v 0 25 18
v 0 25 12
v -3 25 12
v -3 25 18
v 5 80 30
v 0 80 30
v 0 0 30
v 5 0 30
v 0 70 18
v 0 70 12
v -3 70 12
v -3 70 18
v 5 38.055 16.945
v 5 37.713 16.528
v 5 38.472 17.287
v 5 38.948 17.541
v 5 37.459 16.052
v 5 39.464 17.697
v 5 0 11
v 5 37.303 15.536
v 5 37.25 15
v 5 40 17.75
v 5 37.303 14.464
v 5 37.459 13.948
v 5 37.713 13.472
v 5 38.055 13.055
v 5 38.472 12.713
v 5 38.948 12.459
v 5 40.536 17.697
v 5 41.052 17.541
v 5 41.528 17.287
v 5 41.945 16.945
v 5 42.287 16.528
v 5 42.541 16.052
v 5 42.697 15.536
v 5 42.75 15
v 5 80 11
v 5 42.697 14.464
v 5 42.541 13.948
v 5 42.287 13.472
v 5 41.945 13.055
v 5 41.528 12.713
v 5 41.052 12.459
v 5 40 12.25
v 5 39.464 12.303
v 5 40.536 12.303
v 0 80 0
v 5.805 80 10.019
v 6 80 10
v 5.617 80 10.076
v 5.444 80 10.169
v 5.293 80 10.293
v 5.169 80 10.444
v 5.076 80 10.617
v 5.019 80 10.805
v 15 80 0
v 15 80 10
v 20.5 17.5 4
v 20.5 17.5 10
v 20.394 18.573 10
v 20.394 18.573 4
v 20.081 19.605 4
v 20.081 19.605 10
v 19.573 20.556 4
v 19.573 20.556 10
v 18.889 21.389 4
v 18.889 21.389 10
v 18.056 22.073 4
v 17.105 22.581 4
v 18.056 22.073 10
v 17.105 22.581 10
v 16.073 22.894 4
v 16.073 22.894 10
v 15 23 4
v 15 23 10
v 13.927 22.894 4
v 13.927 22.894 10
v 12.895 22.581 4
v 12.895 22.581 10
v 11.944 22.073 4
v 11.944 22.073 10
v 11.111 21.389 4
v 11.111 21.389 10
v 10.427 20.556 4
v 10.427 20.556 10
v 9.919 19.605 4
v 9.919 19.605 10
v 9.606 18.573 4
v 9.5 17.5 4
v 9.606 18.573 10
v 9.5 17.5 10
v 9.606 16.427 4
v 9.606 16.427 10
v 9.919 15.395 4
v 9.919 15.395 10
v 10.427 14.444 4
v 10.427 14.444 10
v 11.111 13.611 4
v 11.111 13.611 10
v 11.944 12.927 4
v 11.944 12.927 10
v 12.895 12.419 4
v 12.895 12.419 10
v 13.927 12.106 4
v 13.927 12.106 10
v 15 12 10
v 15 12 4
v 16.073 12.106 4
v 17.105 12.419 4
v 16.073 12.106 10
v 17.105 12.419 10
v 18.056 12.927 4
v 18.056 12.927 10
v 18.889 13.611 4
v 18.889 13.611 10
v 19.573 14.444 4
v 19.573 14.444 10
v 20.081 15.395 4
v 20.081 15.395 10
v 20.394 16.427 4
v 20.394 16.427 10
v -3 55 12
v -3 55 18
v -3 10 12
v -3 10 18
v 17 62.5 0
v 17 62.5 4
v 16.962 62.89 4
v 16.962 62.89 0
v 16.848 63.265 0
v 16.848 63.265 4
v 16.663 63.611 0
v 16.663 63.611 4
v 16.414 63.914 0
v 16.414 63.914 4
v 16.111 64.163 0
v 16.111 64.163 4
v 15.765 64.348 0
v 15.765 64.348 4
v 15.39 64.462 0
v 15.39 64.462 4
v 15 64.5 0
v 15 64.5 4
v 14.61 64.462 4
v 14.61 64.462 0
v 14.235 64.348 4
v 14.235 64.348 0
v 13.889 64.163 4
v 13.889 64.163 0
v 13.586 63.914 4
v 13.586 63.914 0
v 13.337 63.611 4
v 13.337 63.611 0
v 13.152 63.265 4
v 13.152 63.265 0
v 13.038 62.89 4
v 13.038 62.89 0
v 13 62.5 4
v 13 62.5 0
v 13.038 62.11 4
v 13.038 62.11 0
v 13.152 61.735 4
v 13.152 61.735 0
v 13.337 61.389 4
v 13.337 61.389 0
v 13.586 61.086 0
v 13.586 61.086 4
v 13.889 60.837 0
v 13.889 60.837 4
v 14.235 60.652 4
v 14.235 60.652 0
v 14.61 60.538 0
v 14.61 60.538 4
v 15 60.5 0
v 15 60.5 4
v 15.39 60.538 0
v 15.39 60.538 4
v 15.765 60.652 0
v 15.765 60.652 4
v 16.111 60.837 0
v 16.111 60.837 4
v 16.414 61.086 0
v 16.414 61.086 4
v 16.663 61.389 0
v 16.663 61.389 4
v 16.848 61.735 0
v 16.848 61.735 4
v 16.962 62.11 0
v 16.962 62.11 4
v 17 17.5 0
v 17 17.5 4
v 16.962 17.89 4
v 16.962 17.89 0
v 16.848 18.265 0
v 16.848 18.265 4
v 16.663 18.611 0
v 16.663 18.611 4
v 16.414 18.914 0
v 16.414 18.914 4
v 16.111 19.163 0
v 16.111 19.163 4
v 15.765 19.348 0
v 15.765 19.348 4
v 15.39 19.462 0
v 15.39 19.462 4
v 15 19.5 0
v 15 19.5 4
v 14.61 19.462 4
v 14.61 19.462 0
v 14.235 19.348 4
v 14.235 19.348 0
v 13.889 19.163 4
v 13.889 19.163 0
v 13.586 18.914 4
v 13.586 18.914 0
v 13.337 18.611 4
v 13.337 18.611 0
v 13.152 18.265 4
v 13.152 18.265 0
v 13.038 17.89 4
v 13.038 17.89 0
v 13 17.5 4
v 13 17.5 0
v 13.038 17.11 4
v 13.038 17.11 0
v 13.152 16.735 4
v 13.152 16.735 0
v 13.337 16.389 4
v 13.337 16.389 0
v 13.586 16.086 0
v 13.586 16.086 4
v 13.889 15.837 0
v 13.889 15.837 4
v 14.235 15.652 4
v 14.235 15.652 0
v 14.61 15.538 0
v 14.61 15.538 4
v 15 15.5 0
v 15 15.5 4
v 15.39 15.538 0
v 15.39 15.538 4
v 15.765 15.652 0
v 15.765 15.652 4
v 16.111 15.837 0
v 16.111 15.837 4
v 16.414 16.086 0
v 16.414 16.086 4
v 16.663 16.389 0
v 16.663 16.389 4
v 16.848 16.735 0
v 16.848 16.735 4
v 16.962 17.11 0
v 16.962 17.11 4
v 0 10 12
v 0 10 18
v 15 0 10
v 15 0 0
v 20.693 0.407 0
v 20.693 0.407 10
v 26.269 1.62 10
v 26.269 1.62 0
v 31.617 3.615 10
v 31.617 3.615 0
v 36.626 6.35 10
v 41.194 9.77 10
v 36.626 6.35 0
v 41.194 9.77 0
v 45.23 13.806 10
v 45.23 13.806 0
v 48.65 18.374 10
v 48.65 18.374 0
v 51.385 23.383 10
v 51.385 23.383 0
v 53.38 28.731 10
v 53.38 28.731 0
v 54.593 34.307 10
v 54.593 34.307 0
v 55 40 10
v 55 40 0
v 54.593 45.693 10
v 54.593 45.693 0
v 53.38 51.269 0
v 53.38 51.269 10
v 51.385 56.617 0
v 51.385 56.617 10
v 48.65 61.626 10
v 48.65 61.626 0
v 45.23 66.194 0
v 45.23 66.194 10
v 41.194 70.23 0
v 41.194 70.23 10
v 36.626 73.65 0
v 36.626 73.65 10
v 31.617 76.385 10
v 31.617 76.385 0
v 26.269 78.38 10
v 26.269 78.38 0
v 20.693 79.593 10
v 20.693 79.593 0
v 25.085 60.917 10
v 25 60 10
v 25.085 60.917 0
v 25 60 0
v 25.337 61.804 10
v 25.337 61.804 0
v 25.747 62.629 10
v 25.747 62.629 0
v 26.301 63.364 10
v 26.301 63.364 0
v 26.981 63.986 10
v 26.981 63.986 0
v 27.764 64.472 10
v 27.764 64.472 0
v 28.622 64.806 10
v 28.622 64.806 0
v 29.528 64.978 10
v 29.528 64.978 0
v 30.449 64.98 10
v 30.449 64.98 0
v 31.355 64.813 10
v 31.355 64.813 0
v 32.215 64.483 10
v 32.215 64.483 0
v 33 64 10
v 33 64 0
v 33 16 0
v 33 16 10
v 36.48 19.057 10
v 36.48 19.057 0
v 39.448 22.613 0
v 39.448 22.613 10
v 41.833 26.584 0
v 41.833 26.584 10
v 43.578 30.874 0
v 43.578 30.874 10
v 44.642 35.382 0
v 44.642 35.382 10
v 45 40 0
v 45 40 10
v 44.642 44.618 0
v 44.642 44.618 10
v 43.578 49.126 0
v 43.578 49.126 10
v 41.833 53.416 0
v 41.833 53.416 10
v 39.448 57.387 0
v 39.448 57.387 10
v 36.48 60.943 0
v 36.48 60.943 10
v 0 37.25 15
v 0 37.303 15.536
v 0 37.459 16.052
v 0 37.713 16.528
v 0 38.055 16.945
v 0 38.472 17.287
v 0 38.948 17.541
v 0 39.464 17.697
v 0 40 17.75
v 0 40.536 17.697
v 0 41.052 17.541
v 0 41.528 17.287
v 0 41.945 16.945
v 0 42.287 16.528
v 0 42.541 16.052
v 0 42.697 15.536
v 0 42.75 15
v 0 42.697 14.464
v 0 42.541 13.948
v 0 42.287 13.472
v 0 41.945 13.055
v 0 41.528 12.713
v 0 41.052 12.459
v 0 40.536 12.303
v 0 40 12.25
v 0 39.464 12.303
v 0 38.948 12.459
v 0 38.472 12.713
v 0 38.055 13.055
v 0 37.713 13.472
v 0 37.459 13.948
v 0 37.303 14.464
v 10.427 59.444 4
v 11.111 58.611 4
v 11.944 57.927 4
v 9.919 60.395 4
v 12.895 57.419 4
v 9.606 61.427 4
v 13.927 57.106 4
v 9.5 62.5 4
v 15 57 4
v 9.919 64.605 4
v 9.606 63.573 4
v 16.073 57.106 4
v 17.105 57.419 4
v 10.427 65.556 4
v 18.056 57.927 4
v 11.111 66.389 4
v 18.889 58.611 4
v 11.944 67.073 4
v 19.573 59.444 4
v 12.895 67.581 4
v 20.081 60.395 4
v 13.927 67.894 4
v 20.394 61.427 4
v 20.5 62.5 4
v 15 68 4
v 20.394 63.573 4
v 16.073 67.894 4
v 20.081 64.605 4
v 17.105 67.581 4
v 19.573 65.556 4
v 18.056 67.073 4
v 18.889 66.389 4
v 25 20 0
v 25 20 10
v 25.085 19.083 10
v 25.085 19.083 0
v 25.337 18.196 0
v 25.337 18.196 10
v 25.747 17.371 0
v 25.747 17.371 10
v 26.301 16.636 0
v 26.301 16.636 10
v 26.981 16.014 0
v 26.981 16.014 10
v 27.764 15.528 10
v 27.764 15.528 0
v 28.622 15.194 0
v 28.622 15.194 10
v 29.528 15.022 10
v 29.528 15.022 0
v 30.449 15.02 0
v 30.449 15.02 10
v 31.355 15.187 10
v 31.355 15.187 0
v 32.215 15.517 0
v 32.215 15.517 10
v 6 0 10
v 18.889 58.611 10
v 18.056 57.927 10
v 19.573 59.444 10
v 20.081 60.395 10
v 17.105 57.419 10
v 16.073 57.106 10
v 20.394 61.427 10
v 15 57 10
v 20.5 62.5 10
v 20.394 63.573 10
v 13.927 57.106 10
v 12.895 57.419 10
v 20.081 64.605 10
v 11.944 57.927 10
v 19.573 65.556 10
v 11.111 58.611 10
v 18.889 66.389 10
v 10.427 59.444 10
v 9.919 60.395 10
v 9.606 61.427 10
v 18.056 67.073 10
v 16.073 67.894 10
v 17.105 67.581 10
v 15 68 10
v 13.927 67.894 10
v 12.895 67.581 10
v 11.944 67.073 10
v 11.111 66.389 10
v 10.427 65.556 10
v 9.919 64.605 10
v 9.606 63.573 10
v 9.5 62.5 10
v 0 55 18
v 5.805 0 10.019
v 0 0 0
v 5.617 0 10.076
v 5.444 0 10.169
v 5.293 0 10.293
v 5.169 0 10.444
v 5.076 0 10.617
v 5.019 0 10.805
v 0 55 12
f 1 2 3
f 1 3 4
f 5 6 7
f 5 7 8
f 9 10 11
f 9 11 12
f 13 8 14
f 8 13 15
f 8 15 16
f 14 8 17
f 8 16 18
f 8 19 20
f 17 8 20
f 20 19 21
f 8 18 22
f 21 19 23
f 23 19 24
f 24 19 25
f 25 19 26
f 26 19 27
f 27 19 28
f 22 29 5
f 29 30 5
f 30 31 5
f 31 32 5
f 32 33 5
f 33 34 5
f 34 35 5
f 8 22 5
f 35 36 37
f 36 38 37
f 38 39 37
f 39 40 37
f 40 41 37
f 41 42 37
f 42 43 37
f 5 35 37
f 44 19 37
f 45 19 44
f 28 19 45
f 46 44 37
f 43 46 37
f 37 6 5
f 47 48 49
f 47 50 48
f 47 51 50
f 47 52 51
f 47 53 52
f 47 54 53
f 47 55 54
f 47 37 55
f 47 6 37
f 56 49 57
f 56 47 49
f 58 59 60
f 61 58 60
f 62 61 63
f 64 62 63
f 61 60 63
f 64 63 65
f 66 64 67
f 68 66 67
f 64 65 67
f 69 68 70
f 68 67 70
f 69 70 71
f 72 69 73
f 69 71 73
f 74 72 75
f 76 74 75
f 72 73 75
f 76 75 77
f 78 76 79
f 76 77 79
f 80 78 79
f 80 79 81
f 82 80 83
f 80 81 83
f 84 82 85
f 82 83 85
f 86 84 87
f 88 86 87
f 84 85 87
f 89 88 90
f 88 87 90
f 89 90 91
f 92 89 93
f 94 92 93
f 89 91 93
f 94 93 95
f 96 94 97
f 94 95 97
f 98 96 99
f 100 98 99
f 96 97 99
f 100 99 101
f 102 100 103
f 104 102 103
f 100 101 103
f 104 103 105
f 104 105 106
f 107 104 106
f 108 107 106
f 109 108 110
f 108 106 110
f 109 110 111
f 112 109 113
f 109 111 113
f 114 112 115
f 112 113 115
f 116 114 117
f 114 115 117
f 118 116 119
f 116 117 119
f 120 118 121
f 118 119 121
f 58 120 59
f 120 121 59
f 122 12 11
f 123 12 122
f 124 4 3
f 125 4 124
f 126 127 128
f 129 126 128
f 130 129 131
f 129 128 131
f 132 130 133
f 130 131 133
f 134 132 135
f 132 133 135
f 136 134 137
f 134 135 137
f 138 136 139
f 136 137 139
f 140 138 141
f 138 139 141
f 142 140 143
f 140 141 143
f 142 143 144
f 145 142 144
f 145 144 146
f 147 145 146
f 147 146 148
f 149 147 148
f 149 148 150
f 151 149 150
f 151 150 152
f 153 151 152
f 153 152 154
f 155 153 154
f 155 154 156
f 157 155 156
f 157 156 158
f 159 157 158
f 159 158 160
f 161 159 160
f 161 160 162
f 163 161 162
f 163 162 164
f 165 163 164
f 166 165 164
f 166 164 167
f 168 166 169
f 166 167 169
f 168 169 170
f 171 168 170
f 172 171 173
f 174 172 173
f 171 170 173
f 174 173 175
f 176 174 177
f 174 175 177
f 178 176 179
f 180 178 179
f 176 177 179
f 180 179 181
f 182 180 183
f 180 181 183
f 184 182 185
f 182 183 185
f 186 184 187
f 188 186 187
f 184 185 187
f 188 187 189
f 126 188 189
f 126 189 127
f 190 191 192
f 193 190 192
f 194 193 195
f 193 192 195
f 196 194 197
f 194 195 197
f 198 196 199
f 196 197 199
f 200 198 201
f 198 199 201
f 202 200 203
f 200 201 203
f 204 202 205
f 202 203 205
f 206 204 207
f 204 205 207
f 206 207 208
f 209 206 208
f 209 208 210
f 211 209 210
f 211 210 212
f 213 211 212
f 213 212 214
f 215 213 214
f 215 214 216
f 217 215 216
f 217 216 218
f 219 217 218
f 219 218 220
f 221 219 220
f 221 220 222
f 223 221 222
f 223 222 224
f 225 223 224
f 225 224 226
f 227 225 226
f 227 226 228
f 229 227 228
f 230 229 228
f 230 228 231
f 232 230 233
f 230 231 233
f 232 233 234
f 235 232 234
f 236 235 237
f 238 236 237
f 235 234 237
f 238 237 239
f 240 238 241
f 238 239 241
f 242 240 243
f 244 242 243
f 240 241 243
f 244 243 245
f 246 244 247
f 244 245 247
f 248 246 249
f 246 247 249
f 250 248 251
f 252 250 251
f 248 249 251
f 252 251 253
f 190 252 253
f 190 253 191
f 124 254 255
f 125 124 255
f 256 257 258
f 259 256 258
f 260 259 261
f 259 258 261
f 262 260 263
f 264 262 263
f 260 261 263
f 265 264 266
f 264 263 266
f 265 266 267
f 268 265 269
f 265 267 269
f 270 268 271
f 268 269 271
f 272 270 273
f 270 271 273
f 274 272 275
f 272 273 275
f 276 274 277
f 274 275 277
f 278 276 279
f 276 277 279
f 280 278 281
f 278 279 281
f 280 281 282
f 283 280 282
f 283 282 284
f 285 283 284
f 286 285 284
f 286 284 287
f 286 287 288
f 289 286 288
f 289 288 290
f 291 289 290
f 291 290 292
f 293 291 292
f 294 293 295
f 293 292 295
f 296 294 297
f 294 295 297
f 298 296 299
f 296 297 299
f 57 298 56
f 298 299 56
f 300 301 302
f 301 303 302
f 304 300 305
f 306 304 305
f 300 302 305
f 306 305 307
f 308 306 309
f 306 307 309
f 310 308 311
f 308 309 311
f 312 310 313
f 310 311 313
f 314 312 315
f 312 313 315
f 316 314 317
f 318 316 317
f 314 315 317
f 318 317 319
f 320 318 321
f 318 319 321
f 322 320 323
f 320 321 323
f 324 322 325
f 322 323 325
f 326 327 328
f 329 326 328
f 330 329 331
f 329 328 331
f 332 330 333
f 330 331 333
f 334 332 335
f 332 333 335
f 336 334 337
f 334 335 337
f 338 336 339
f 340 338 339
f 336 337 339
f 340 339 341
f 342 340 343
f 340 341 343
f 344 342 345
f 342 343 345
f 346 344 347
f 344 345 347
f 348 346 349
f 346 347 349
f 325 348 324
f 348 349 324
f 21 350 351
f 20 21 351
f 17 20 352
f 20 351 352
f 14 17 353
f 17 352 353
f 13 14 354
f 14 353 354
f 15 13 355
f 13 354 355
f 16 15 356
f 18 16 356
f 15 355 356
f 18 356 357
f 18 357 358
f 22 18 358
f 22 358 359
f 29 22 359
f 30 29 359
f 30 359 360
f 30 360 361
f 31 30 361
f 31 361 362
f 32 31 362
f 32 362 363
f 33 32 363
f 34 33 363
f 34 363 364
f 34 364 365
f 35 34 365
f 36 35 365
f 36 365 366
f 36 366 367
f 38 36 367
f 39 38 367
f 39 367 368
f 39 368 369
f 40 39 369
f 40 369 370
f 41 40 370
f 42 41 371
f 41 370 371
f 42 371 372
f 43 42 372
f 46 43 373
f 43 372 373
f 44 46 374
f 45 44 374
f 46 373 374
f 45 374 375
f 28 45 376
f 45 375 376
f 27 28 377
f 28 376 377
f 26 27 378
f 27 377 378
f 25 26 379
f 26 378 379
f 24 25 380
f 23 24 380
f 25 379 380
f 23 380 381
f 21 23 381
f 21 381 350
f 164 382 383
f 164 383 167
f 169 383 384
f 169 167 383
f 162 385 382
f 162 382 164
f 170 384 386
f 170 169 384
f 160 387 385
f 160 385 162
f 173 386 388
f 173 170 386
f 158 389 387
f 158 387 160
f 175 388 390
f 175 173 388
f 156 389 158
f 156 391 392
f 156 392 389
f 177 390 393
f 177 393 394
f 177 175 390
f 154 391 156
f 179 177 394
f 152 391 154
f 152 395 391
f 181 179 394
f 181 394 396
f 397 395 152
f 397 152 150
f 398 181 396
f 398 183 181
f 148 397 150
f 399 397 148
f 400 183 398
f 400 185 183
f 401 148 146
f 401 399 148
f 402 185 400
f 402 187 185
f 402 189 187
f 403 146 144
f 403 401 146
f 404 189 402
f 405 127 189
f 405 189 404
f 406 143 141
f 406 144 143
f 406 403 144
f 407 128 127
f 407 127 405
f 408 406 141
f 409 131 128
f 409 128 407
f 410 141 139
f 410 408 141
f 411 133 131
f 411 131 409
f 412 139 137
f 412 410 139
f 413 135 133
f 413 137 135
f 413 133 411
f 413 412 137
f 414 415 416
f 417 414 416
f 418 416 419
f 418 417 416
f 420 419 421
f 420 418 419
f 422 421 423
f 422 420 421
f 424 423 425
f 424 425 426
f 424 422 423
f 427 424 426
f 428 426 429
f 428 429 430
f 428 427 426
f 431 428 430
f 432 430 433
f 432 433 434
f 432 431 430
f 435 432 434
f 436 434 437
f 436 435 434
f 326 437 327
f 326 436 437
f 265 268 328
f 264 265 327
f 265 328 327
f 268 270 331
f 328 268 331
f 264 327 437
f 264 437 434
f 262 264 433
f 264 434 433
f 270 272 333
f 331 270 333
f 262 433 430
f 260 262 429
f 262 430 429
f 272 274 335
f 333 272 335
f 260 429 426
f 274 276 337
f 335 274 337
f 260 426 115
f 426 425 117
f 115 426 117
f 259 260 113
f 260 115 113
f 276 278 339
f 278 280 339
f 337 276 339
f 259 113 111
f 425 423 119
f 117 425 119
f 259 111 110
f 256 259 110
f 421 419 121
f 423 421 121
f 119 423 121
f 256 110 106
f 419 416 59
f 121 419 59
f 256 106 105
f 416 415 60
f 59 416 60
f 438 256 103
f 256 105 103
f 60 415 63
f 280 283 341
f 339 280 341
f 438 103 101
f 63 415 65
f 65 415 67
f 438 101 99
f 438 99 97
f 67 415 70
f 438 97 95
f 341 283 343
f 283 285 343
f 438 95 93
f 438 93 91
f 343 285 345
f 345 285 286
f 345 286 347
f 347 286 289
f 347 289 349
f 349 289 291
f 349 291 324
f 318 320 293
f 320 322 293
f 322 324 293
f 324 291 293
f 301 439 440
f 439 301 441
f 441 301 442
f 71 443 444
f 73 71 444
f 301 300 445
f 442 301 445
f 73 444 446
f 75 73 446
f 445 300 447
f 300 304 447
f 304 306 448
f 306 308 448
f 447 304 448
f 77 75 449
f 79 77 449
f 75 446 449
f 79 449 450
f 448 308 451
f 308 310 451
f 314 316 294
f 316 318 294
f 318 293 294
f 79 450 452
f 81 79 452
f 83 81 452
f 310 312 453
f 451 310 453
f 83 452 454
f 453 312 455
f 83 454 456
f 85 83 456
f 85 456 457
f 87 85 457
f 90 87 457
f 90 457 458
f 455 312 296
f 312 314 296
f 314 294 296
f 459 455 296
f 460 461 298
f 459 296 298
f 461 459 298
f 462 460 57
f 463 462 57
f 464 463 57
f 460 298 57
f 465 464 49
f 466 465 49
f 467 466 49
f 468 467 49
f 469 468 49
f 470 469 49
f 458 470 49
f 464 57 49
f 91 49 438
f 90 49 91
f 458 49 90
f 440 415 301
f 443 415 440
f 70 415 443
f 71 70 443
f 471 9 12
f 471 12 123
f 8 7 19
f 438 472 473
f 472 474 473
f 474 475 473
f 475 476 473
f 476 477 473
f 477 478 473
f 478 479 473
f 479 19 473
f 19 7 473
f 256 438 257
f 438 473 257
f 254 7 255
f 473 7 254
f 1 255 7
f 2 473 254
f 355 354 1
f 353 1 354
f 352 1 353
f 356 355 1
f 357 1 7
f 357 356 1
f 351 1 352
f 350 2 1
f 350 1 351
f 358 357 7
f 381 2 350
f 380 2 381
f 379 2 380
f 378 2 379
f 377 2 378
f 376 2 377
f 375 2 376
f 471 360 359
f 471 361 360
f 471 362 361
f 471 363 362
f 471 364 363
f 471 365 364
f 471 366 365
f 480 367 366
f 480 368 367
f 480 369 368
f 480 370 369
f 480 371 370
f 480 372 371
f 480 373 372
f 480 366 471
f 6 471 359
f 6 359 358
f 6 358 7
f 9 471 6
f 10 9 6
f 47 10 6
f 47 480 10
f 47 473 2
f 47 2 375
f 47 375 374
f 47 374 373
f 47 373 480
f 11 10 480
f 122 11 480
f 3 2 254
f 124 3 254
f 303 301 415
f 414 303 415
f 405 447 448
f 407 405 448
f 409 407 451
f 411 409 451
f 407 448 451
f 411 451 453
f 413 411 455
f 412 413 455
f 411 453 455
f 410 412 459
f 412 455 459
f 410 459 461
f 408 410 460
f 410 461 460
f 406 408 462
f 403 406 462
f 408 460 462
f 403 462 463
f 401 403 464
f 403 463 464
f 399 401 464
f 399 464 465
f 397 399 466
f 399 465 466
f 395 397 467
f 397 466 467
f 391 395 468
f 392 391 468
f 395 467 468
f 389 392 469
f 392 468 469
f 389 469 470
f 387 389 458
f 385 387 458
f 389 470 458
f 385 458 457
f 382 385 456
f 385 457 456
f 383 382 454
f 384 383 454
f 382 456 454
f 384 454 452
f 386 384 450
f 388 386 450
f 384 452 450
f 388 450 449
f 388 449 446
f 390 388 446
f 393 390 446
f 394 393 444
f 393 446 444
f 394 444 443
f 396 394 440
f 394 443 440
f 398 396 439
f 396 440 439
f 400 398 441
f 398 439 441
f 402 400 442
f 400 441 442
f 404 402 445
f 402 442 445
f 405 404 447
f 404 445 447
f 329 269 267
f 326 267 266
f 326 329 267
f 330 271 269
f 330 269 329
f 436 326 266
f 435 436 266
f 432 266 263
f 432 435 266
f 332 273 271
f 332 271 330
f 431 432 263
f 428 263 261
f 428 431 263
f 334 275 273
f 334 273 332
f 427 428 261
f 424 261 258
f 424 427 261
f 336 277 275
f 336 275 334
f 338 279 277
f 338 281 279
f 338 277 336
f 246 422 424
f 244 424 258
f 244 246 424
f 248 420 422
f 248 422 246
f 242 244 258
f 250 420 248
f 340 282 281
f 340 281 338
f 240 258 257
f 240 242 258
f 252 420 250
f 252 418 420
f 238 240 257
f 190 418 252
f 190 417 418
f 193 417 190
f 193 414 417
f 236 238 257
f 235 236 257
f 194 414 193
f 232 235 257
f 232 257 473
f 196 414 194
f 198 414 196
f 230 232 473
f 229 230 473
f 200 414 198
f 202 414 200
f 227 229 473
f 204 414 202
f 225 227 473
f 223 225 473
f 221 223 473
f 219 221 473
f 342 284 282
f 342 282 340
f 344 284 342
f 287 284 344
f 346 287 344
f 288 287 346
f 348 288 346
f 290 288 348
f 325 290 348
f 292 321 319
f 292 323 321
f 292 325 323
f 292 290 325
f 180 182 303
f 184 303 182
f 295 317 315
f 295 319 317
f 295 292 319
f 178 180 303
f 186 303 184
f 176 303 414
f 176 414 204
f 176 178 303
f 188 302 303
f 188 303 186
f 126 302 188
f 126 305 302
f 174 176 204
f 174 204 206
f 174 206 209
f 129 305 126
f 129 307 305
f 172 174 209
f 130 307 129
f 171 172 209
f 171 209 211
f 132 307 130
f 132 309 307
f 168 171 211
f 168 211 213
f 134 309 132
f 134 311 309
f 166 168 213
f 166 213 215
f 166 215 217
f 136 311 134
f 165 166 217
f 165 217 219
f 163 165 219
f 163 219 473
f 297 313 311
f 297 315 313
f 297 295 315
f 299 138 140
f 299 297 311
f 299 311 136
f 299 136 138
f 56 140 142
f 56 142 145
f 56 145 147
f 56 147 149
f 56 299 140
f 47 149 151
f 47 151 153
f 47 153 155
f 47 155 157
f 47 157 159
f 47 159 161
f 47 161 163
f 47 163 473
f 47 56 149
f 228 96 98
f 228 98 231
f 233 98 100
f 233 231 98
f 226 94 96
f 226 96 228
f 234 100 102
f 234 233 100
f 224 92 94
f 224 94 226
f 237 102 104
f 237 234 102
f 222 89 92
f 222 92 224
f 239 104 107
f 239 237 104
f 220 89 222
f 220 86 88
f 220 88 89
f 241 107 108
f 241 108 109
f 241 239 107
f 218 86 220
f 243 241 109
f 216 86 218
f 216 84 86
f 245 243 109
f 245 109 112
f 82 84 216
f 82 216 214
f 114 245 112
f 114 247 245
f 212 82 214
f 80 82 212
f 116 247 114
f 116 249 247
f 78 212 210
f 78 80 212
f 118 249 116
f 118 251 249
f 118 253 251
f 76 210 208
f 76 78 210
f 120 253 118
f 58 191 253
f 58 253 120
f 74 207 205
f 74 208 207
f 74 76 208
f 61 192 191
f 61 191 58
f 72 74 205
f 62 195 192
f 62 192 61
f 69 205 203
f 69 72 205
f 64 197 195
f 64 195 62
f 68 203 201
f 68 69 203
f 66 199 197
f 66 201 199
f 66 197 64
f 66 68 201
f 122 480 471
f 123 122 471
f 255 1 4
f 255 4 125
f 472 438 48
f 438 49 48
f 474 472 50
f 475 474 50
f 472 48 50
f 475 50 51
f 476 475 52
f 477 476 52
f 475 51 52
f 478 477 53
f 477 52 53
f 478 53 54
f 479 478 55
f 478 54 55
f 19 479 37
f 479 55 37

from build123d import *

# Parameters (mm, degrees)
PAD_DEPTH       = 10
SKETCH001_R     = 2
POCKET_DEPTH    = 10.001
SKETCH002_R     = 5.5
POCKET001_DEPTH = 6
SKETCH004_W     = 5
SKETCH004_H     = 80
PAD001_DEPTH    = 20
SKETCH006_W     = 15
SKETCH006_H     = 6
PAD002_DEPTH    = 3
POCKET004_DEPTH = 10.001
SKETCH008_R     = 2.75
POCKET005_DEPTH = 55.001
FILLET_R        = 5
FILLET001_R     = 1


with BuildPart() as part:
    # Sketch → Pad (new body)
    with BuildSketch(Plane.XY):
        with BuildLine():
            Line((0, 0), (0, 80))
            Line((0, 80), (15, 80))
            ThreePointArc((15, 0), (55, 40), (15, 80))
            Line((0, 0), (15, 0))
        make_face()
    extrude(amount=PAD_DEPTH)

    # Sketch001 (on Face6 of Pad) → Pocket (cut, through all)
    with BuildSketch(Plane.XY.offset(10)):
        with Locations((15, 62.5)):
            Circle(SKETCH001_R)
        with Locations((15, 17.5)):
            Circle(SKETCH001_R)
    extrude(amount=-POCKET_DEPTH, mode=Mode.SUBTRACT)

    # Sketch002 (on Face5 of Pocket) → Pocket001 (cut)
    with BuildSketch(Plane.XY.offset(10)):
        with Locations((15, 62.5)):
            Circle(SKETCH002_R)
        with Locations((15, 17.5)):
            Circle(SKETCH002_R)
    extrude(amount=-POCKET001_DEPTH, mode=Mode.SUBTRACT)

    # Sketch004 → Pad001 (join)
    with BuildSketch(Plane.XY.offset(10)):
        with Locations((2.5, 40)):
            Rectangle(SKETCH004_W, SKETCH004_H)
    extrude(amount=PAD001_DEPTH)

    # Sketch006 → Pad002 (join)
    with BuildSketch(Plane(origin=(0, 0, 0), x_dir=(0, -1, 0), z_dir=(-1, 0, 0))):
        with Locations((-62.5, 15)):
            Rectangle(SKETCH006_W, SKETCH006_H)
        with Locations((-17.5, 15)):
            Rectangle(SKETCH006_W, SKETCH006_H)
    extrude(amount=PAD002_DEPTH)

    # Sketch007 (on Face8 of Pad002) → Pocket004 (cut, through all)
    with BuildSketch(Plane.XY.offset(10)):
        with BuildLine():
            ThreePointArc((25, 11.715729), (45, 40), (25, 68.284271))
            Line((25, 68.284271), (25, 11.715729))
        make_face()
    extrude(amount=-POCKET004_DEPTH, mode=Mode.SUBTRACT)

    # Sketch008 (on Face5 of Pocket004) → Pocket005 (cut, through all)
    with BuildSketch(Plane(origin=(0, 0, 0), x_dir=(0, -1, 0), z_dir=(-1, 0, 0))):
        with Locations((-40, 15)):
            Circle(SKETCH008_R)
    extrude(amount=-POCKET005_DEPTH, mode=Mode.SUBTRACT)

    # Fillet
    fillet_edges = [part.edges().sort_by_distance(p)[0] for p in [
        (25, 68.284271, 5),
        (25, 11.715729, 5),
    ]]
    fillet(fillet_edges, radius=FILLET_R)

    # Fillet001
    fillet001_edges = [part.edges().sort_by_distance(p)[0] for p in [
        (5, 40, 10),
    ]]
    fillet(fillet001_edges, radius=FILLET001_R)


solid = part.part
